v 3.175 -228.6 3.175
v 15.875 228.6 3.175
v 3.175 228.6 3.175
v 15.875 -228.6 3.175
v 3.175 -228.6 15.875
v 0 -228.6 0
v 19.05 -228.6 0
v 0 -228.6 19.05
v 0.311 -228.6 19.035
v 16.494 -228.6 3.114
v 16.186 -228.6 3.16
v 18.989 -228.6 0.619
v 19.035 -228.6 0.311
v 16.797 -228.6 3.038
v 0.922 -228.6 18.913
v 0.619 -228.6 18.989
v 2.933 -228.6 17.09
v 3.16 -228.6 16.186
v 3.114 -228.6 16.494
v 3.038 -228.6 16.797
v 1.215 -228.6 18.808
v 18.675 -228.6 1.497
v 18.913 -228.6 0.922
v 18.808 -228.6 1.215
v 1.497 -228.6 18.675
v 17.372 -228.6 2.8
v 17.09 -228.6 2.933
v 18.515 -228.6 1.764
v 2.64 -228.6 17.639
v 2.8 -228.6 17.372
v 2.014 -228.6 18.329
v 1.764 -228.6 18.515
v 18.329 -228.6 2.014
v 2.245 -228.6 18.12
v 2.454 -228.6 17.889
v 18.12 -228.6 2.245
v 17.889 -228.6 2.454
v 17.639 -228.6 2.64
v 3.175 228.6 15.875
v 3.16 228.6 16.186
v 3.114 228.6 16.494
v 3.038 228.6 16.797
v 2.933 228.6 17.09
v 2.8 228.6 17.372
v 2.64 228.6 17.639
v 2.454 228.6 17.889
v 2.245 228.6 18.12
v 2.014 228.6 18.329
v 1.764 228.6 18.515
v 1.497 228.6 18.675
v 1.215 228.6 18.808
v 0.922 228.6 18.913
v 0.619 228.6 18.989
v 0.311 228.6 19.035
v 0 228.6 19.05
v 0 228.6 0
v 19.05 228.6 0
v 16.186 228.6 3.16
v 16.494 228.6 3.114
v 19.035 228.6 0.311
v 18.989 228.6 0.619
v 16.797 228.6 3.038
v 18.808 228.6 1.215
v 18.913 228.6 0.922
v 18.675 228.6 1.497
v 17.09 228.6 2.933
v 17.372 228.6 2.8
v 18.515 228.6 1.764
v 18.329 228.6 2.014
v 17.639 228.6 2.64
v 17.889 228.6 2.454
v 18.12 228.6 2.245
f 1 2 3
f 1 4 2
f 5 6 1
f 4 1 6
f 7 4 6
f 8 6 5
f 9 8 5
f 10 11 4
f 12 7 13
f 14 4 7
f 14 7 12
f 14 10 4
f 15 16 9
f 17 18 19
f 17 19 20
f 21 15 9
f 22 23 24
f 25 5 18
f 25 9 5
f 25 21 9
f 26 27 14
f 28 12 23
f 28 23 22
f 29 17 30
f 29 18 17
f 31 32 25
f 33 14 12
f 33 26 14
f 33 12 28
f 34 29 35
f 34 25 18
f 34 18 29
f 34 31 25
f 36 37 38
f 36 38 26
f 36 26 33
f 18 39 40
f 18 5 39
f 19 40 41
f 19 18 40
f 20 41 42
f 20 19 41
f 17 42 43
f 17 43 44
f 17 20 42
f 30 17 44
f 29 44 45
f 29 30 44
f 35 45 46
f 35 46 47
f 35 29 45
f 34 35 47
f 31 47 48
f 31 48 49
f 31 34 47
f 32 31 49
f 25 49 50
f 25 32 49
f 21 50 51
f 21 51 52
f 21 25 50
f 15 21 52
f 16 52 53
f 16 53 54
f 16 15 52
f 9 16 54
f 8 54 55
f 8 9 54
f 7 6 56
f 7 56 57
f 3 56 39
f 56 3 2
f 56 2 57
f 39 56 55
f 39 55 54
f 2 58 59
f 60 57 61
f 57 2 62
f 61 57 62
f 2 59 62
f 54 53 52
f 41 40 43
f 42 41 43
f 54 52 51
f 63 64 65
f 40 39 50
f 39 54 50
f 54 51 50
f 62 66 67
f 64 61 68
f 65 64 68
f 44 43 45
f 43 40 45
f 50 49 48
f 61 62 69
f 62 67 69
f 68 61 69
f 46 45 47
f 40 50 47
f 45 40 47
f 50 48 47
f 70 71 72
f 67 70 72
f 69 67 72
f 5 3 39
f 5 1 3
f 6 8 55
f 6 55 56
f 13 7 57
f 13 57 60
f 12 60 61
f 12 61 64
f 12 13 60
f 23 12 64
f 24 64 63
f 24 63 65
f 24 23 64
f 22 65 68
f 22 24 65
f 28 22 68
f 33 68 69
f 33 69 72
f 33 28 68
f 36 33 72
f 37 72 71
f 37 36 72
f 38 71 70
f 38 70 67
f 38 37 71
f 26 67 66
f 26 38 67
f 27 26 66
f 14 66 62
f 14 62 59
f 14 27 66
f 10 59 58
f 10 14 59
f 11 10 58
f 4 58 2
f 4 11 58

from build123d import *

# Parameters (mm, degrees)
F1_DEPTH = 228.6


with BuildPart() as f1:
    # F0 (on Front) → F1 (new body, symmetric)
    with BuildSketch(Plane.XZ):
        with BuildLine():
            ThreePointArc((3.175, 15.875), (2.245064, 18.120064), (0, 19.05))
            Line((0, 19.05), (0, 0))
            Line((0, 0), (19.05, 0))
            ThreePointArc((19.05, 0), (18.120064, 2.245064), (15.875, 3.175))
            Line((15.875, 3.175), (3.175, 3.175))
            Line((3.175, 3.175), (3.175, 15.875))
        make_face()
    extrude(amount=F1_DEPTH, both=True)


solid = f1.part
